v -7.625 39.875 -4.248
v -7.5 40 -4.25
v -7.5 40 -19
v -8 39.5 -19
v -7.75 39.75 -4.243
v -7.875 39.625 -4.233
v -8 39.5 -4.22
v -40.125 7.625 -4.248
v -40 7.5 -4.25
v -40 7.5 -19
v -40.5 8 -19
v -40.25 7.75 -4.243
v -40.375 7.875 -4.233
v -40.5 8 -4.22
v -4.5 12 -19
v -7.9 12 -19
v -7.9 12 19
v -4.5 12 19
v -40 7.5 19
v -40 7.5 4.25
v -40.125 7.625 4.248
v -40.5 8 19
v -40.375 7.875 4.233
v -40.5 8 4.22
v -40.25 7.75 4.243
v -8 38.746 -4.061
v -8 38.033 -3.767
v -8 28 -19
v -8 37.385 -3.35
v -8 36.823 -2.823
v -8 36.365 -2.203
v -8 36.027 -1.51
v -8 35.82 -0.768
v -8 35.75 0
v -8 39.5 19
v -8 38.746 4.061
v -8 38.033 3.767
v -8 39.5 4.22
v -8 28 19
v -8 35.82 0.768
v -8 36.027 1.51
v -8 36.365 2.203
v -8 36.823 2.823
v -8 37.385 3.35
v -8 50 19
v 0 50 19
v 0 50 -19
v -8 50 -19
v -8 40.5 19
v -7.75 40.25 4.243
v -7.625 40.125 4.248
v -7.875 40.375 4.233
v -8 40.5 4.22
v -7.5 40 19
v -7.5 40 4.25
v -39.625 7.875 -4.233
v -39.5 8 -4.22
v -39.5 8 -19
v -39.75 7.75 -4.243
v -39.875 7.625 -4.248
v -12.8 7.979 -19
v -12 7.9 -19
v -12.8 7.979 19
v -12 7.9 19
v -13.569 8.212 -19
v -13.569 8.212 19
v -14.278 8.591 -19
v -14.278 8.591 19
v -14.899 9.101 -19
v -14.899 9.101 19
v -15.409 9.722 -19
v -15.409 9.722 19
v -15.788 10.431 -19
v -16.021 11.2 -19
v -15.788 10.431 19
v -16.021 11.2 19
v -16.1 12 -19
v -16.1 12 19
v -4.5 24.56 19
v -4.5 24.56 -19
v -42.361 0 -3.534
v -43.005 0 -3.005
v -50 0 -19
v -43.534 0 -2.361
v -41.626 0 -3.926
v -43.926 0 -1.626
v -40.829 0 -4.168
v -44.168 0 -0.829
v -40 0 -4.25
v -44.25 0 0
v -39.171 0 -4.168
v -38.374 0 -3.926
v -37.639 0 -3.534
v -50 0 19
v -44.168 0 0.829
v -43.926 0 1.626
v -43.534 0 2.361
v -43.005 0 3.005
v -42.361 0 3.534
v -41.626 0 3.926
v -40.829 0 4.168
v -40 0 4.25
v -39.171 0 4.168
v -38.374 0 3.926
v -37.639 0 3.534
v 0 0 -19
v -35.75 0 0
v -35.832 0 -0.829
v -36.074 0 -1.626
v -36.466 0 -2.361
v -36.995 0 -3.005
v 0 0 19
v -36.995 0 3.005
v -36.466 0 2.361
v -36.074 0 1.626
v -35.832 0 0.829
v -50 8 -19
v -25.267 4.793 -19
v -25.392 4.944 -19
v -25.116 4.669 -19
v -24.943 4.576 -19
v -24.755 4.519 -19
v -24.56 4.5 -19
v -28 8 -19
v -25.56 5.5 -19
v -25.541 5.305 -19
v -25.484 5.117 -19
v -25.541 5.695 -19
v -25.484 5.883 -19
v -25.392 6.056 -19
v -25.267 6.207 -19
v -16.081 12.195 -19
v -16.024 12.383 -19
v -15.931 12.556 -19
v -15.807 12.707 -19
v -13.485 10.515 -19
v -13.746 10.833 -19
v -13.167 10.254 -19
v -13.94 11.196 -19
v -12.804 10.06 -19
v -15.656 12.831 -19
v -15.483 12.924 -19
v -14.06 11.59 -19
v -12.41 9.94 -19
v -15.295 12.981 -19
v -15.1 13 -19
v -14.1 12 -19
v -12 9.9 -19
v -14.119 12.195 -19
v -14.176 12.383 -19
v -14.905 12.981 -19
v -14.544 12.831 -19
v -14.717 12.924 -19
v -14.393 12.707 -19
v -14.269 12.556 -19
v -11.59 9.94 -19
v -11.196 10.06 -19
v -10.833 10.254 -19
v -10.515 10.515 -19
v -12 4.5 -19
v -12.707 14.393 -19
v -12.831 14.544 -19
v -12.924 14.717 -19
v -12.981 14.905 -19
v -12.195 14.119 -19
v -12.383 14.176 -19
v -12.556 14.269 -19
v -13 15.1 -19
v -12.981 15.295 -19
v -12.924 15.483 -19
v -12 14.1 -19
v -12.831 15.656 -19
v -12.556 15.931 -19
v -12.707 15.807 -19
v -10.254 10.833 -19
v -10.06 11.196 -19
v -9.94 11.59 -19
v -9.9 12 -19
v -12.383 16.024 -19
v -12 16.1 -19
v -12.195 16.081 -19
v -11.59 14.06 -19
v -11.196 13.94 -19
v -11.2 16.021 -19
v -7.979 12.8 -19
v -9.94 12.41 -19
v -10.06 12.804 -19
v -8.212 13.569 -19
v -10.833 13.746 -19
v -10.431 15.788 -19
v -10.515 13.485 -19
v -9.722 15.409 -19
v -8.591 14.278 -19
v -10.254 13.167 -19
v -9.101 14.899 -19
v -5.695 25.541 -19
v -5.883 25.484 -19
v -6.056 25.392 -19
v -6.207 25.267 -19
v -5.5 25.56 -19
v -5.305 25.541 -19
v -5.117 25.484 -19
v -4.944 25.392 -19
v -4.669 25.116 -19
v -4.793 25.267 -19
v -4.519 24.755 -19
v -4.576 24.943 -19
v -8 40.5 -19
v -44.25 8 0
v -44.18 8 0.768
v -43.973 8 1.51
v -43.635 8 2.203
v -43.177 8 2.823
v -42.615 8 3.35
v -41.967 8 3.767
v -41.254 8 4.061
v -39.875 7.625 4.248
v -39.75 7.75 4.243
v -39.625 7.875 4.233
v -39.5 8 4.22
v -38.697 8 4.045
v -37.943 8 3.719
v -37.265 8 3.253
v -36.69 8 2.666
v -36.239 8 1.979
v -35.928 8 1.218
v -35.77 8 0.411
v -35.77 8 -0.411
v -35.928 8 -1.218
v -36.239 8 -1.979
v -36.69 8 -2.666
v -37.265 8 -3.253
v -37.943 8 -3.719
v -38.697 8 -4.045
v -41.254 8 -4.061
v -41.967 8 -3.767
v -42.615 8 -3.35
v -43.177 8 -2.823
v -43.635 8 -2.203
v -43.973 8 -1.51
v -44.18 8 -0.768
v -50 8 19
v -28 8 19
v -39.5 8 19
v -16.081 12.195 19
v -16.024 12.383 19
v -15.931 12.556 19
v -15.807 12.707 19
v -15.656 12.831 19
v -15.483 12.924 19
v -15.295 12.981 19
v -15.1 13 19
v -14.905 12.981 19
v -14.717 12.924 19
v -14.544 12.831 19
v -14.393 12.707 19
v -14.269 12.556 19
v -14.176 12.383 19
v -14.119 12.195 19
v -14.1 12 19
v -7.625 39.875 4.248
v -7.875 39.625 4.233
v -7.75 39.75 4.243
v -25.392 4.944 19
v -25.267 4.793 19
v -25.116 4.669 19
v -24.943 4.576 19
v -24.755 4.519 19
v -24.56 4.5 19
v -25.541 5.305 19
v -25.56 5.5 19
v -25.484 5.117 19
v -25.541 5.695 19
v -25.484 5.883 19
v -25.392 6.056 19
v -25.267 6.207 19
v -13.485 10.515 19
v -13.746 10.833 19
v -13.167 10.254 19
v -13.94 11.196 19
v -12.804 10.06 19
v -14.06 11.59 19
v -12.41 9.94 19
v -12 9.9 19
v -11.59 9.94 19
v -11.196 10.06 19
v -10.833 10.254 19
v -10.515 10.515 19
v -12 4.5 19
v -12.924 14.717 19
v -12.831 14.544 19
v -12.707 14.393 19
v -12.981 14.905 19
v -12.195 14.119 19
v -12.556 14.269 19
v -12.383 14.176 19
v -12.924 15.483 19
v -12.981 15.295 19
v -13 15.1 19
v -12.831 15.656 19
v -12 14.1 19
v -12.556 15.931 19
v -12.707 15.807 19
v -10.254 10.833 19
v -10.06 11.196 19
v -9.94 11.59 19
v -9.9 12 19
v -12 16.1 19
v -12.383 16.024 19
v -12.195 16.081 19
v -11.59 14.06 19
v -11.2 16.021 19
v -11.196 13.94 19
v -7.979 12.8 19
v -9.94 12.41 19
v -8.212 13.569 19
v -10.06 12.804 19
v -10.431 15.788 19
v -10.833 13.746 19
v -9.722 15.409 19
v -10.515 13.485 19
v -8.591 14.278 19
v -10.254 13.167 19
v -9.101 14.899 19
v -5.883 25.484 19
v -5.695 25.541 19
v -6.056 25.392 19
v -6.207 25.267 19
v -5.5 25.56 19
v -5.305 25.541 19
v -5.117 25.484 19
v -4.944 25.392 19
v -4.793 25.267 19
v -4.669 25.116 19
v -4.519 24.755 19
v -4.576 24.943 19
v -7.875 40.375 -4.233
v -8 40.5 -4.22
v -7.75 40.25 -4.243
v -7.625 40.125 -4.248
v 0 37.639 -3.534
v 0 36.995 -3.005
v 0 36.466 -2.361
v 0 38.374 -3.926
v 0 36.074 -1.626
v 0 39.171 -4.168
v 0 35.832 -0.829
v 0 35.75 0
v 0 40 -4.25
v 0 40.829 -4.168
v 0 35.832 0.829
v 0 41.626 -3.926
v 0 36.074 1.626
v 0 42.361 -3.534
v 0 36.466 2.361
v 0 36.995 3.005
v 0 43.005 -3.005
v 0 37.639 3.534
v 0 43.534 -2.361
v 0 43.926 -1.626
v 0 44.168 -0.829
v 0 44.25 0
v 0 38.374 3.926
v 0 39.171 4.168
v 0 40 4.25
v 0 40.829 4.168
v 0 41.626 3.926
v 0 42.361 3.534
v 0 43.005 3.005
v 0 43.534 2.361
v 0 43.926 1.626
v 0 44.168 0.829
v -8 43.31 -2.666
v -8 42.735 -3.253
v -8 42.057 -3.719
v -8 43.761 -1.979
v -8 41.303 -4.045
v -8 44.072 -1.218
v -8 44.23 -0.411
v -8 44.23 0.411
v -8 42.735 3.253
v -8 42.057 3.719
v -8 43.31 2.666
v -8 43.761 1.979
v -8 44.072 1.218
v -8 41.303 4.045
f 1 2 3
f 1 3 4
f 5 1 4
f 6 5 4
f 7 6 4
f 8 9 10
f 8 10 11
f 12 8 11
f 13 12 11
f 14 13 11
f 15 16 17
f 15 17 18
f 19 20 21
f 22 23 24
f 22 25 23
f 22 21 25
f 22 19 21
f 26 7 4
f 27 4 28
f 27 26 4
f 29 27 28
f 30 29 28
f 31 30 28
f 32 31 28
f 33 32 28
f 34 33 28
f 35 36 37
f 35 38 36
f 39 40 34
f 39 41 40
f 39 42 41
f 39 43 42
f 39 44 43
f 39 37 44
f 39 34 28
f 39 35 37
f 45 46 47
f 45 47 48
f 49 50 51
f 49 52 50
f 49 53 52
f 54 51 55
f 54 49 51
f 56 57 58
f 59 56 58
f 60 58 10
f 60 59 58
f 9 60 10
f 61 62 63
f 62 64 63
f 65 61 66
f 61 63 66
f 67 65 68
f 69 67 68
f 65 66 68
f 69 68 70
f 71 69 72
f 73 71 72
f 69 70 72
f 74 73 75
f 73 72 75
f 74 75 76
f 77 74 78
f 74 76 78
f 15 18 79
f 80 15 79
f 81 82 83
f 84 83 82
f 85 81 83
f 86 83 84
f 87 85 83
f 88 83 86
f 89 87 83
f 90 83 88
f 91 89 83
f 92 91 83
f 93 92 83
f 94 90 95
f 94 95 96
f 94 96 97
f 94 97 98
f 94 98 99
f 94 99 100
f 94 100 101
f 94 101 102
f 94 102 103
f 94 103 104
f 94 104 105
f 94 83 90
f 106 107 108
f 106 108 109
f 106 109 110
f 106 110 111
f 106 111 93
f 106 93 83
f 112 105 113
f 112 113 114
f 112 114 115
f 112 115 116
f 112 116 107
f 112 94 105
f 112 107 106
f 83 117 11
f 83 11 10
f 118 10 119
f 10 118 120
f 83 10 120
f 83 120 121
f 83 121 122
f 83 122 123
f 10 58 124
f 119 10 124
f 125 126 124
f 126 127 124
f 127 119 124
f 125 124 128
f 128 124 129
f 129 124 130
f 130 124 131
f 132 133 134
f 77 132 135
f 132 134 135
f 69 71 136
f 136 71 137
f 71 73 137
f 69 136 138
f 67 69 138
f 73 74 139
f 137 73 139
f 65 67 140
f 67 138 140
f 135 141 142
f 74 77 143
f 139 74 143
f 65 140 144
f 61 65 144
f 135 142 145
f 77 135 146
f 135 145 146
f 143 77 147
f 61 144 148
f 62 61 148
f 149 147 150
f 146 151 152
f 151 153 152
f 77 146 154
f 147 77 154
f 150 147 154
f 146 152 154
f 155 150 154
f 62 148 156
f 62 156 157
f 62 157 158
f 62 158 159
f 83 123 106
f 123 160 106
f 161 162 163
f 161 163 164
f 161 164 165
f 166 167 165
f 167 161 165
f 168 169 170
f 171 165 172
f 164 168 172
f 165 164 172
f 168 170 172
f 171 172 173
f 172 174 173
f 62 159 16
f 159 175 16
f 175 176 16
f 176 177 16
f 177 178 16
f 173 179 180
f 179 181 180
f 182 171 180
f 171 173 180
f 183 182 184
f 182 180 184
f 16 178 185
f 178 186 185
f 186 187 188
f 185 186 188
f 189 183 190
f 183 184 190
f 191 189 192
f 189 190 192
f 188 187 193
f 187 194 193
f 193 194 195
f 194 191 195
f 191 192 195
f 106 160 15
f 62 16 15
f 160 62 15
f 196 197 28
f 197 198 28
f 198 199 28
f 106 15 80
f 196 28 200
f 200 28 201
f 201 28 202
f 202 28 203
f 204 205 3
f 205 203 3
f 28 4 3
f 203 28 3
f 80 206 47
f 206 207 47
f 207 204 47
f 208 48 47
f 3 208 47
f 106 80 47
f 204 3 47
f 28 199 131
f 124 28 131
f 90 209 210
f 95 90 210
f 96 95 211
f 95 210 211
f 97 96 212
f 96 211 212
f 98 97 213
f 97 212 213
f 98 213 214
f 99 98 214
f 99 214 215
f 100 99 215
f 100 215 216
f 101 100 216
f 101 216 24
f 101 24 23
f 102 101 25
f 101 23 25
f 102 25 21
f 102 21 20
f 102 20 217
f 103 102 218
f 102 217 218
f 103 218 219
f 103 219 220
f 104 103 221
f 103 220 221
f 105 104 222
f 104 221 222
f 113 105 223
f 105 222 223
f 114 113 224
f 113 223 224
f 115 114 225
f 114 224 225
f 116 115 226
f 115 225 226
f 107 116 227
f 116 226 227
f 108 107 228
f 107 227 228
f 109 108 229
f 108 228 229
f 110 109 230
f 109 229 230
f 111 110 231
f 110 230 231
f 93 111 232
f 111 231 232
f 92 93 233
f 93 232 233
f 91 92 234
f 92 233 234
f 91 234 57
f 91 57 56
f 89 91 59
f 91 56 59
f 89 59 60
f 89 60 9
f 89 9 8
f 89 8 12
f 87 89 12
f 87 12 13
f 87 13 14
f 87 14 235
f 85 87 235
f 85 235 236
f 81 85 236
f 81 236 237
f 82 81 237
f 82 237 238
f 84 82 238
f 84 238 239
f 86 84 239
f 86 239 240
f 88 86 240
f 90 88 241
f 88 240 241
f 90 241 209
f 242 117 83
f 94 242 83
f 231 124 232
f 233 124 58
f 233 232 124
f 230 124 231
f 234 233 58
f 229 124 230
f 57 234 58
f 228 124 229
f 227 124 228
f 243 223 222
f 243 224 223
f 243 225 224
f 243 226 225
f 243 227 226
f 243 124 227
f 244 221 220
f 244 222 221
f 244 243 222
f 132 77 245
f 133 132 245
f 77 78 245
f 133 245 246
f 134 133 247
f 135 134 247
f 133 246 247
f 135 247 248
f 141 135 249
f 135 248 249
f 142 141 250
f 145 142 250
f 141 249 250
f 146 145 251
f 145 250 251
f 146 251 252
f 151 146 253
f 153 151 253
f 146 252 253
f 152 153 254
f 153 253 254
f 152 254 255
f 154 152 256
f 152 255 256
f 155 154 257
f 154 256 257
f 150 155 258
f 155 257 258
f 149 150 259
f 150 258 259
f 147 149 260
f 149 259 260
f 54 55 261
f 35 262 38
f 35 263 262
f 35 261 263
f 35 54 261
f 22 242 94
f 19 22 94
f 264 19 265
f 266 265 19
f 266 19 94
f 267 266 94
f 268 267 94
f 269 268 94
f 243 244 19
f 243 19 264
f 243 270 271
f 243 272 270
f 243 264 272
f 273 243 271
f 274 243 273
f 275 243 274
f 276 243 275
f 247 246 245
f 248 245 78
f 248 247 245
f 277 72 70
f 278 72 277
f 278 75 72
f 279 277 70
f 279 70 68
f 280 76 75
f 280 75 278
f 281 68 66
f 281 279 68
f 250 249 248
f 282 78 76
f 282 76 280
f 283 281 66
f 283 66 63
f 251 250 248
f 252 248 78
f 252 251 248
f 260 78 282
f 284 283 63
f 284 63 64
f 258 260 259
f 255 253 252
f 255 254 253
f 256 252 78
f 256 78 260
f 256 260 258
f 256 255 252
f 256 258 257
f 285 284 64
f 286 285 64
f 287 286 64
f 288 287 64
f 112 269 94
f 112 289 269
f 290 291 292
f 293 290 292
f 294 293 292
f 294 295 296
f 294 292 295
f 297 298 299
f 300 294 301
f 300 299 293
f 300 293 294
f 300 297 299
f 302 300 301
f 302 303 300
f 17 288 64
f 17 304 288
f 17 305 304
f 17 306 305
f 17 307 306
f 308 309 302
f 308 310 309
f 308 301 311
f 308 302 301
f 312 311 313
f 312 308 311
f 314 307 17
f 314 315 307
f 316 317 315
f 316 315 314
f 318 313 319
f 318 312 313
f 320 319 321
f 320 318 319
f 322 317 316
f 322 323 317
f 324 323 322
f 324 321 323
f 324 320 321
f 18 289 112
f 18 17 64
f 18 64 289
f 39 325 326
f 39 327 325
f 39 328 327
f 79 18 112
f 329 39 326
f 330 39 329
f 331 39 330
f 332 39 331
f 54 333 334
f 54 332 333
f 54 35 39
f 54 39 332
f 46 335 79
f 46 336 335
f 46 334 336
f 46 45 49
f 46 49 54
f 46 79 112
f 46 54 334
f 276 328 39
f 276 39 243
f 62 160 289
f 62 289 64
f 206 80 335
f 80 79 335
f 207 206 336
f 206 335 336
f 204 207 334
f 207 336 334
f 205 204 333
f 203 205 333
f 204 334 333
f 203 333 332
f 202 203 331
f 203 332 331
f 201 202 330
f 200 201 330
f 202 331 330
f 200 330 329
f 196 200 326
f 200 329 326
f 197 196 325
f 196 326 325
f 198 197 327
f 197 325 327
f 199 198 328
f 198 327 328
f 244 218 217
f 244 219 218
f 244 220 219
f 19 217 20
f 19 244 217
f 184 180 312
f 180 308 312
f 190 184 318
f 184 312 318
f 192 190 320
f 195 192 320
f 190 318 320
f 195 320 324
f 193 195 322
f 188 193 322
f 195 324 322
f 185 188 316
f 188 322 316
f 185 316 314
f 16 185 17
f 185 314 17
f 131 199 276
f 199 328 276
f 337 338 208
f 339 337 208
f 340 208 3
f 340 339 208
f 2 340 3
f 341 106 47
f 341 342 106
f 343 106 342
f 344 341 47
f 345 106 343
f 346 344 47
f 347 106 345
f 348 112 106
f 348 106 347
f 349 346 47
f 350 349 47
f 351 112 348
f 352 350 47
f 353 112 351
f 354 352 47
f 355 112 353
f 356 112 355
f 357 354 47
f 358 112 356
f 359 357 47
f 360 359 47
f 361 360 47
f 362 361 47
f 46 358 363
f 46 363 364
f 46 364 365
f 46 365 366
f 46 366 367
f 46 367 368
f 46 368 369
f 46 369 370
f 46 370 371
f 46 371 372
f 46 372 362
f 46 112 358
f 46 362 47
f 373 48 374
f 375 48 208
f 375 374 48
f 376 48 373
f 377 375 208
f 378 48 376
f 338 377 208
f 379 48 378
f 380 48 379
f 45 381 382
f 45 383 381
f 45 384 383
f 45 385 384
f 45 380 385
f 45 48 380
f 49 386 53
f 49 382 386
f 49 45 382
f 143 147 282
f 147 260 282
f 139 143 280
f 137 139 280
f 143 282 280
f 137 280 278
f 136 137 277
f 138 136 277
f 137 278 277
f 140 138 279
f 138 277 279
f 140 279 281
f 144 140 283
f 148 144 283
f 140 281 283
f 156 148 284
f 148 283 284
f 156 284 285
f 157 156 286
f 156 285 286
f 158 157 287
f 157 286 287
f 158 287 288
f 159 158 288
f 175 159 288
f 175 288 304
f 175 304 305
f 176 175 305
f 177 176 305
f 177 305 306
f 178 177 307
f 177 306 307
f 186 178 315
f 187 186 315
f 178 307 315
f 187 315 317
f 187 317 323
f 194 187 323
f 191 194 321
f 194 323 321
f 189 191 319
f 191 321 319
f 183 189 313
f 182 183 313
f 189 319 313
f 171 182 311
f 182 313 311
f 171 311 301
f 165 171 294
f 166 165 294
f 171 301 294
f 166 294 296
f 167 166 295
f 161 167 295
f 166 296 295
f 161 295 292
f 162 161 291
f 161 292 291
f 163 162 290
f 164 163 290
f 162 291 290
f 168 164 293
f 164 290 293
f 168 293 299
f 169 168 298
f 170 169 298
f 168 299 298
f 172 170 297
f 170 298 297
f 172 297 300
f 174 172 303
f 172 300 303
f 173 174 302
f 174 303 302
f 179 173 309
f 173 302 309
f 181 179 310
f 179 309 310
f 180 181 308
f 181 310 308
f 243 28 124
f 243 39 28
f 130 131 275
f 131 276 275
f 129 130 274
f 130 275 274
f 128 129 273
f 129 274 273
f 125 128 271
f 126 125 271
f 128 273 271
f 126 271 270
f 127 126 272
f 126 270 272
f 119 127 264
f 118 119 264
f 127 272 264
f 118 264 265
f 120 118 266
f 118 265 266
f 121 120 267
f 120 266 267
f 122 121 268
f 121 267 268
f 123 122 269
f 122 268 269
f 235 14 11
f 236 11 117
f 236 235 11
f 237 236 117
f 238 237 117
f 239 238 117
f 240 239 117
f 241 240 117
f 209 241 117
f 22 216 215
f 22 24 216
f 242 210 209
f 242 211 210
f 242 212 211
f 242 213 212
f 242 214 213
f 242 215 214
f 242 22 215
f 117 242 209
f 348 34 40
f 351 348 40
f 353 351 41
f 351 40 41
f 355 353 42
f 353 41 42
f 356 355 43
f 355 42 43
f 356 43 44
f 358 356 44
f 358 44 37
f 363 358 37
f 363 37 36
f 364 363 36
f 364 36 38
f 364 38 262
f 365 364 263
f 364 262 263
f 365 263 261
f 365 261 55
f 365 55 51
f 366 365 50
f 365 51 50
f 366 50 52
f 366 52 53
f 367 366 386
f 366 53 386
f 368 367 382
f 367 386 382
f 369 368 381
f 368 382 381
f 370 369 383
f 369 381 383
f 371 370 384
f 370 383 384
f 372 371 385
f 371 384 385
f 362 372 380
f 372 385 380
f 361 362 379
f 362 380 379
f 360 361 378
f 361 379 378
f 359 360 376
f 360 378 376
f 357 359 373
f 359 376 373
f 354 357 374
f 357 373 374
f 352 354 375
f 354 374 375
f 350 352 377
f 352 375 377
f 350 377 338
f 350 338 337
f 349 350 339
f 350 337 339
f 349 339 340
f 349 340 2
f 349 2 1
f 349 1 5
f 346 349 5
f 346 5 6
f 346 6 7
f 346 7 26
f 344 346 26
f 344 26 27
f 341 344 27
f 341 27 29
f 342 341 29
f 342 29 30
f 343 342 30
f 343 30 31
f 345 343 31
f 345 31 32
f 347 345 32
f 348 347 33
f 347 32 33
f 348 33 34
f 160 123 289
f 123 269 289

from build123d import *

# Parameters (mm, degrees)
EXTRUDE_1_DEPTH     = 19
SKETCH_2_R          = 4.25
CUT_EXTRUDE_1_DEPTH = 9
SKETCH_3_R          = 4.25
CUT_EXTRUDE_2_DEPTH = 9


with BuildPart() as part:
    # Эскиз1 → Бобышка-Вытянуть1 (new body, symmetric)
    with BuildSketch(Plane.XY):
        Polygon((-50, 0), (0, 0), (0, 50), (-8, 50), (-8, 40.5), (-7.5, 40), (-8, 39.5), (-8, 28), (-28, 8), (-39.5, 8), (-40, 7.5), (-40.5, 8), (-50, 8), align=None)
        with BuildLine():
            Line((-4.5, 12), (-4.5, 24.560303038))
            ThreePointArc((-4.5, 24.560303038), (-5.117316568, 25.484182571), (-6.207106781, 25.267409819))
            Line((-6.207106781, 25.267409819), (-25.267409819, 6.207106781))
            ThreePointArc((-25.267409819, 6.207106781), (-25.484182571, 5.117316568), (-24.560303038, 4.5))
            Line((-24.560303038, 4.5), (-12, 4.5))
            Line((-12, 4.5), (-12, 7.9))
            ThreePointArc((-12, 7.9), (-14.899137803, 9.100862197), (-16.1, 12))
            ThreePointArc((-16.1, 12), (-15.1, 13), (-14.1, 12))
            ThreePointArc((-14.1, 12), (-10.51507576, 10.51507576), (-12, 14.1))
            ThreePointArc((-12, 14.1), (-13, 15.1), (-12, 16.1))
            ThreePointArc((-12, 16.1), (-9.100862197, 14.899137803), (-7.9, 12))
            Line((-7.9, 12), (-4.5, 12))
        make_face(mode=Mode.SUBTRACT)
    extrude(amount=EXTRUDE_1_DEPTH, both=True)

    # Эскиз2 → Вырез-Вытянуть1 (cut, through all)
    with BuildSketch(Plane.ZY.offset(8)):
        with Locations(Location((0, 40, 0), (0, 0, 270))):  # turned: the seam where the file's is
            Circle(SKETCH_2_R)
    extrude(amount=-CUT_EXTRUDE_1_DEPTH, mode=Mode.SUBTRACT)

    # Эскиз3 → Вырез-Вытянуть2 (cut, through all)
    with BuildSketch(Plane(origin=(0, 8, 0), x_dir=(1, 0, 0), z_dir=(0, 1, 0))):
        with Locations(Location((-40, 0, 0), (0, 0, 180))):  # turned: the seam where the file's is
            Circle(SKETCH_3_R)
    extrude(amount=-CUT_EXTRUDE_2_DEPTH, mode=Mode.SUBTRACT)


solid = part.part
